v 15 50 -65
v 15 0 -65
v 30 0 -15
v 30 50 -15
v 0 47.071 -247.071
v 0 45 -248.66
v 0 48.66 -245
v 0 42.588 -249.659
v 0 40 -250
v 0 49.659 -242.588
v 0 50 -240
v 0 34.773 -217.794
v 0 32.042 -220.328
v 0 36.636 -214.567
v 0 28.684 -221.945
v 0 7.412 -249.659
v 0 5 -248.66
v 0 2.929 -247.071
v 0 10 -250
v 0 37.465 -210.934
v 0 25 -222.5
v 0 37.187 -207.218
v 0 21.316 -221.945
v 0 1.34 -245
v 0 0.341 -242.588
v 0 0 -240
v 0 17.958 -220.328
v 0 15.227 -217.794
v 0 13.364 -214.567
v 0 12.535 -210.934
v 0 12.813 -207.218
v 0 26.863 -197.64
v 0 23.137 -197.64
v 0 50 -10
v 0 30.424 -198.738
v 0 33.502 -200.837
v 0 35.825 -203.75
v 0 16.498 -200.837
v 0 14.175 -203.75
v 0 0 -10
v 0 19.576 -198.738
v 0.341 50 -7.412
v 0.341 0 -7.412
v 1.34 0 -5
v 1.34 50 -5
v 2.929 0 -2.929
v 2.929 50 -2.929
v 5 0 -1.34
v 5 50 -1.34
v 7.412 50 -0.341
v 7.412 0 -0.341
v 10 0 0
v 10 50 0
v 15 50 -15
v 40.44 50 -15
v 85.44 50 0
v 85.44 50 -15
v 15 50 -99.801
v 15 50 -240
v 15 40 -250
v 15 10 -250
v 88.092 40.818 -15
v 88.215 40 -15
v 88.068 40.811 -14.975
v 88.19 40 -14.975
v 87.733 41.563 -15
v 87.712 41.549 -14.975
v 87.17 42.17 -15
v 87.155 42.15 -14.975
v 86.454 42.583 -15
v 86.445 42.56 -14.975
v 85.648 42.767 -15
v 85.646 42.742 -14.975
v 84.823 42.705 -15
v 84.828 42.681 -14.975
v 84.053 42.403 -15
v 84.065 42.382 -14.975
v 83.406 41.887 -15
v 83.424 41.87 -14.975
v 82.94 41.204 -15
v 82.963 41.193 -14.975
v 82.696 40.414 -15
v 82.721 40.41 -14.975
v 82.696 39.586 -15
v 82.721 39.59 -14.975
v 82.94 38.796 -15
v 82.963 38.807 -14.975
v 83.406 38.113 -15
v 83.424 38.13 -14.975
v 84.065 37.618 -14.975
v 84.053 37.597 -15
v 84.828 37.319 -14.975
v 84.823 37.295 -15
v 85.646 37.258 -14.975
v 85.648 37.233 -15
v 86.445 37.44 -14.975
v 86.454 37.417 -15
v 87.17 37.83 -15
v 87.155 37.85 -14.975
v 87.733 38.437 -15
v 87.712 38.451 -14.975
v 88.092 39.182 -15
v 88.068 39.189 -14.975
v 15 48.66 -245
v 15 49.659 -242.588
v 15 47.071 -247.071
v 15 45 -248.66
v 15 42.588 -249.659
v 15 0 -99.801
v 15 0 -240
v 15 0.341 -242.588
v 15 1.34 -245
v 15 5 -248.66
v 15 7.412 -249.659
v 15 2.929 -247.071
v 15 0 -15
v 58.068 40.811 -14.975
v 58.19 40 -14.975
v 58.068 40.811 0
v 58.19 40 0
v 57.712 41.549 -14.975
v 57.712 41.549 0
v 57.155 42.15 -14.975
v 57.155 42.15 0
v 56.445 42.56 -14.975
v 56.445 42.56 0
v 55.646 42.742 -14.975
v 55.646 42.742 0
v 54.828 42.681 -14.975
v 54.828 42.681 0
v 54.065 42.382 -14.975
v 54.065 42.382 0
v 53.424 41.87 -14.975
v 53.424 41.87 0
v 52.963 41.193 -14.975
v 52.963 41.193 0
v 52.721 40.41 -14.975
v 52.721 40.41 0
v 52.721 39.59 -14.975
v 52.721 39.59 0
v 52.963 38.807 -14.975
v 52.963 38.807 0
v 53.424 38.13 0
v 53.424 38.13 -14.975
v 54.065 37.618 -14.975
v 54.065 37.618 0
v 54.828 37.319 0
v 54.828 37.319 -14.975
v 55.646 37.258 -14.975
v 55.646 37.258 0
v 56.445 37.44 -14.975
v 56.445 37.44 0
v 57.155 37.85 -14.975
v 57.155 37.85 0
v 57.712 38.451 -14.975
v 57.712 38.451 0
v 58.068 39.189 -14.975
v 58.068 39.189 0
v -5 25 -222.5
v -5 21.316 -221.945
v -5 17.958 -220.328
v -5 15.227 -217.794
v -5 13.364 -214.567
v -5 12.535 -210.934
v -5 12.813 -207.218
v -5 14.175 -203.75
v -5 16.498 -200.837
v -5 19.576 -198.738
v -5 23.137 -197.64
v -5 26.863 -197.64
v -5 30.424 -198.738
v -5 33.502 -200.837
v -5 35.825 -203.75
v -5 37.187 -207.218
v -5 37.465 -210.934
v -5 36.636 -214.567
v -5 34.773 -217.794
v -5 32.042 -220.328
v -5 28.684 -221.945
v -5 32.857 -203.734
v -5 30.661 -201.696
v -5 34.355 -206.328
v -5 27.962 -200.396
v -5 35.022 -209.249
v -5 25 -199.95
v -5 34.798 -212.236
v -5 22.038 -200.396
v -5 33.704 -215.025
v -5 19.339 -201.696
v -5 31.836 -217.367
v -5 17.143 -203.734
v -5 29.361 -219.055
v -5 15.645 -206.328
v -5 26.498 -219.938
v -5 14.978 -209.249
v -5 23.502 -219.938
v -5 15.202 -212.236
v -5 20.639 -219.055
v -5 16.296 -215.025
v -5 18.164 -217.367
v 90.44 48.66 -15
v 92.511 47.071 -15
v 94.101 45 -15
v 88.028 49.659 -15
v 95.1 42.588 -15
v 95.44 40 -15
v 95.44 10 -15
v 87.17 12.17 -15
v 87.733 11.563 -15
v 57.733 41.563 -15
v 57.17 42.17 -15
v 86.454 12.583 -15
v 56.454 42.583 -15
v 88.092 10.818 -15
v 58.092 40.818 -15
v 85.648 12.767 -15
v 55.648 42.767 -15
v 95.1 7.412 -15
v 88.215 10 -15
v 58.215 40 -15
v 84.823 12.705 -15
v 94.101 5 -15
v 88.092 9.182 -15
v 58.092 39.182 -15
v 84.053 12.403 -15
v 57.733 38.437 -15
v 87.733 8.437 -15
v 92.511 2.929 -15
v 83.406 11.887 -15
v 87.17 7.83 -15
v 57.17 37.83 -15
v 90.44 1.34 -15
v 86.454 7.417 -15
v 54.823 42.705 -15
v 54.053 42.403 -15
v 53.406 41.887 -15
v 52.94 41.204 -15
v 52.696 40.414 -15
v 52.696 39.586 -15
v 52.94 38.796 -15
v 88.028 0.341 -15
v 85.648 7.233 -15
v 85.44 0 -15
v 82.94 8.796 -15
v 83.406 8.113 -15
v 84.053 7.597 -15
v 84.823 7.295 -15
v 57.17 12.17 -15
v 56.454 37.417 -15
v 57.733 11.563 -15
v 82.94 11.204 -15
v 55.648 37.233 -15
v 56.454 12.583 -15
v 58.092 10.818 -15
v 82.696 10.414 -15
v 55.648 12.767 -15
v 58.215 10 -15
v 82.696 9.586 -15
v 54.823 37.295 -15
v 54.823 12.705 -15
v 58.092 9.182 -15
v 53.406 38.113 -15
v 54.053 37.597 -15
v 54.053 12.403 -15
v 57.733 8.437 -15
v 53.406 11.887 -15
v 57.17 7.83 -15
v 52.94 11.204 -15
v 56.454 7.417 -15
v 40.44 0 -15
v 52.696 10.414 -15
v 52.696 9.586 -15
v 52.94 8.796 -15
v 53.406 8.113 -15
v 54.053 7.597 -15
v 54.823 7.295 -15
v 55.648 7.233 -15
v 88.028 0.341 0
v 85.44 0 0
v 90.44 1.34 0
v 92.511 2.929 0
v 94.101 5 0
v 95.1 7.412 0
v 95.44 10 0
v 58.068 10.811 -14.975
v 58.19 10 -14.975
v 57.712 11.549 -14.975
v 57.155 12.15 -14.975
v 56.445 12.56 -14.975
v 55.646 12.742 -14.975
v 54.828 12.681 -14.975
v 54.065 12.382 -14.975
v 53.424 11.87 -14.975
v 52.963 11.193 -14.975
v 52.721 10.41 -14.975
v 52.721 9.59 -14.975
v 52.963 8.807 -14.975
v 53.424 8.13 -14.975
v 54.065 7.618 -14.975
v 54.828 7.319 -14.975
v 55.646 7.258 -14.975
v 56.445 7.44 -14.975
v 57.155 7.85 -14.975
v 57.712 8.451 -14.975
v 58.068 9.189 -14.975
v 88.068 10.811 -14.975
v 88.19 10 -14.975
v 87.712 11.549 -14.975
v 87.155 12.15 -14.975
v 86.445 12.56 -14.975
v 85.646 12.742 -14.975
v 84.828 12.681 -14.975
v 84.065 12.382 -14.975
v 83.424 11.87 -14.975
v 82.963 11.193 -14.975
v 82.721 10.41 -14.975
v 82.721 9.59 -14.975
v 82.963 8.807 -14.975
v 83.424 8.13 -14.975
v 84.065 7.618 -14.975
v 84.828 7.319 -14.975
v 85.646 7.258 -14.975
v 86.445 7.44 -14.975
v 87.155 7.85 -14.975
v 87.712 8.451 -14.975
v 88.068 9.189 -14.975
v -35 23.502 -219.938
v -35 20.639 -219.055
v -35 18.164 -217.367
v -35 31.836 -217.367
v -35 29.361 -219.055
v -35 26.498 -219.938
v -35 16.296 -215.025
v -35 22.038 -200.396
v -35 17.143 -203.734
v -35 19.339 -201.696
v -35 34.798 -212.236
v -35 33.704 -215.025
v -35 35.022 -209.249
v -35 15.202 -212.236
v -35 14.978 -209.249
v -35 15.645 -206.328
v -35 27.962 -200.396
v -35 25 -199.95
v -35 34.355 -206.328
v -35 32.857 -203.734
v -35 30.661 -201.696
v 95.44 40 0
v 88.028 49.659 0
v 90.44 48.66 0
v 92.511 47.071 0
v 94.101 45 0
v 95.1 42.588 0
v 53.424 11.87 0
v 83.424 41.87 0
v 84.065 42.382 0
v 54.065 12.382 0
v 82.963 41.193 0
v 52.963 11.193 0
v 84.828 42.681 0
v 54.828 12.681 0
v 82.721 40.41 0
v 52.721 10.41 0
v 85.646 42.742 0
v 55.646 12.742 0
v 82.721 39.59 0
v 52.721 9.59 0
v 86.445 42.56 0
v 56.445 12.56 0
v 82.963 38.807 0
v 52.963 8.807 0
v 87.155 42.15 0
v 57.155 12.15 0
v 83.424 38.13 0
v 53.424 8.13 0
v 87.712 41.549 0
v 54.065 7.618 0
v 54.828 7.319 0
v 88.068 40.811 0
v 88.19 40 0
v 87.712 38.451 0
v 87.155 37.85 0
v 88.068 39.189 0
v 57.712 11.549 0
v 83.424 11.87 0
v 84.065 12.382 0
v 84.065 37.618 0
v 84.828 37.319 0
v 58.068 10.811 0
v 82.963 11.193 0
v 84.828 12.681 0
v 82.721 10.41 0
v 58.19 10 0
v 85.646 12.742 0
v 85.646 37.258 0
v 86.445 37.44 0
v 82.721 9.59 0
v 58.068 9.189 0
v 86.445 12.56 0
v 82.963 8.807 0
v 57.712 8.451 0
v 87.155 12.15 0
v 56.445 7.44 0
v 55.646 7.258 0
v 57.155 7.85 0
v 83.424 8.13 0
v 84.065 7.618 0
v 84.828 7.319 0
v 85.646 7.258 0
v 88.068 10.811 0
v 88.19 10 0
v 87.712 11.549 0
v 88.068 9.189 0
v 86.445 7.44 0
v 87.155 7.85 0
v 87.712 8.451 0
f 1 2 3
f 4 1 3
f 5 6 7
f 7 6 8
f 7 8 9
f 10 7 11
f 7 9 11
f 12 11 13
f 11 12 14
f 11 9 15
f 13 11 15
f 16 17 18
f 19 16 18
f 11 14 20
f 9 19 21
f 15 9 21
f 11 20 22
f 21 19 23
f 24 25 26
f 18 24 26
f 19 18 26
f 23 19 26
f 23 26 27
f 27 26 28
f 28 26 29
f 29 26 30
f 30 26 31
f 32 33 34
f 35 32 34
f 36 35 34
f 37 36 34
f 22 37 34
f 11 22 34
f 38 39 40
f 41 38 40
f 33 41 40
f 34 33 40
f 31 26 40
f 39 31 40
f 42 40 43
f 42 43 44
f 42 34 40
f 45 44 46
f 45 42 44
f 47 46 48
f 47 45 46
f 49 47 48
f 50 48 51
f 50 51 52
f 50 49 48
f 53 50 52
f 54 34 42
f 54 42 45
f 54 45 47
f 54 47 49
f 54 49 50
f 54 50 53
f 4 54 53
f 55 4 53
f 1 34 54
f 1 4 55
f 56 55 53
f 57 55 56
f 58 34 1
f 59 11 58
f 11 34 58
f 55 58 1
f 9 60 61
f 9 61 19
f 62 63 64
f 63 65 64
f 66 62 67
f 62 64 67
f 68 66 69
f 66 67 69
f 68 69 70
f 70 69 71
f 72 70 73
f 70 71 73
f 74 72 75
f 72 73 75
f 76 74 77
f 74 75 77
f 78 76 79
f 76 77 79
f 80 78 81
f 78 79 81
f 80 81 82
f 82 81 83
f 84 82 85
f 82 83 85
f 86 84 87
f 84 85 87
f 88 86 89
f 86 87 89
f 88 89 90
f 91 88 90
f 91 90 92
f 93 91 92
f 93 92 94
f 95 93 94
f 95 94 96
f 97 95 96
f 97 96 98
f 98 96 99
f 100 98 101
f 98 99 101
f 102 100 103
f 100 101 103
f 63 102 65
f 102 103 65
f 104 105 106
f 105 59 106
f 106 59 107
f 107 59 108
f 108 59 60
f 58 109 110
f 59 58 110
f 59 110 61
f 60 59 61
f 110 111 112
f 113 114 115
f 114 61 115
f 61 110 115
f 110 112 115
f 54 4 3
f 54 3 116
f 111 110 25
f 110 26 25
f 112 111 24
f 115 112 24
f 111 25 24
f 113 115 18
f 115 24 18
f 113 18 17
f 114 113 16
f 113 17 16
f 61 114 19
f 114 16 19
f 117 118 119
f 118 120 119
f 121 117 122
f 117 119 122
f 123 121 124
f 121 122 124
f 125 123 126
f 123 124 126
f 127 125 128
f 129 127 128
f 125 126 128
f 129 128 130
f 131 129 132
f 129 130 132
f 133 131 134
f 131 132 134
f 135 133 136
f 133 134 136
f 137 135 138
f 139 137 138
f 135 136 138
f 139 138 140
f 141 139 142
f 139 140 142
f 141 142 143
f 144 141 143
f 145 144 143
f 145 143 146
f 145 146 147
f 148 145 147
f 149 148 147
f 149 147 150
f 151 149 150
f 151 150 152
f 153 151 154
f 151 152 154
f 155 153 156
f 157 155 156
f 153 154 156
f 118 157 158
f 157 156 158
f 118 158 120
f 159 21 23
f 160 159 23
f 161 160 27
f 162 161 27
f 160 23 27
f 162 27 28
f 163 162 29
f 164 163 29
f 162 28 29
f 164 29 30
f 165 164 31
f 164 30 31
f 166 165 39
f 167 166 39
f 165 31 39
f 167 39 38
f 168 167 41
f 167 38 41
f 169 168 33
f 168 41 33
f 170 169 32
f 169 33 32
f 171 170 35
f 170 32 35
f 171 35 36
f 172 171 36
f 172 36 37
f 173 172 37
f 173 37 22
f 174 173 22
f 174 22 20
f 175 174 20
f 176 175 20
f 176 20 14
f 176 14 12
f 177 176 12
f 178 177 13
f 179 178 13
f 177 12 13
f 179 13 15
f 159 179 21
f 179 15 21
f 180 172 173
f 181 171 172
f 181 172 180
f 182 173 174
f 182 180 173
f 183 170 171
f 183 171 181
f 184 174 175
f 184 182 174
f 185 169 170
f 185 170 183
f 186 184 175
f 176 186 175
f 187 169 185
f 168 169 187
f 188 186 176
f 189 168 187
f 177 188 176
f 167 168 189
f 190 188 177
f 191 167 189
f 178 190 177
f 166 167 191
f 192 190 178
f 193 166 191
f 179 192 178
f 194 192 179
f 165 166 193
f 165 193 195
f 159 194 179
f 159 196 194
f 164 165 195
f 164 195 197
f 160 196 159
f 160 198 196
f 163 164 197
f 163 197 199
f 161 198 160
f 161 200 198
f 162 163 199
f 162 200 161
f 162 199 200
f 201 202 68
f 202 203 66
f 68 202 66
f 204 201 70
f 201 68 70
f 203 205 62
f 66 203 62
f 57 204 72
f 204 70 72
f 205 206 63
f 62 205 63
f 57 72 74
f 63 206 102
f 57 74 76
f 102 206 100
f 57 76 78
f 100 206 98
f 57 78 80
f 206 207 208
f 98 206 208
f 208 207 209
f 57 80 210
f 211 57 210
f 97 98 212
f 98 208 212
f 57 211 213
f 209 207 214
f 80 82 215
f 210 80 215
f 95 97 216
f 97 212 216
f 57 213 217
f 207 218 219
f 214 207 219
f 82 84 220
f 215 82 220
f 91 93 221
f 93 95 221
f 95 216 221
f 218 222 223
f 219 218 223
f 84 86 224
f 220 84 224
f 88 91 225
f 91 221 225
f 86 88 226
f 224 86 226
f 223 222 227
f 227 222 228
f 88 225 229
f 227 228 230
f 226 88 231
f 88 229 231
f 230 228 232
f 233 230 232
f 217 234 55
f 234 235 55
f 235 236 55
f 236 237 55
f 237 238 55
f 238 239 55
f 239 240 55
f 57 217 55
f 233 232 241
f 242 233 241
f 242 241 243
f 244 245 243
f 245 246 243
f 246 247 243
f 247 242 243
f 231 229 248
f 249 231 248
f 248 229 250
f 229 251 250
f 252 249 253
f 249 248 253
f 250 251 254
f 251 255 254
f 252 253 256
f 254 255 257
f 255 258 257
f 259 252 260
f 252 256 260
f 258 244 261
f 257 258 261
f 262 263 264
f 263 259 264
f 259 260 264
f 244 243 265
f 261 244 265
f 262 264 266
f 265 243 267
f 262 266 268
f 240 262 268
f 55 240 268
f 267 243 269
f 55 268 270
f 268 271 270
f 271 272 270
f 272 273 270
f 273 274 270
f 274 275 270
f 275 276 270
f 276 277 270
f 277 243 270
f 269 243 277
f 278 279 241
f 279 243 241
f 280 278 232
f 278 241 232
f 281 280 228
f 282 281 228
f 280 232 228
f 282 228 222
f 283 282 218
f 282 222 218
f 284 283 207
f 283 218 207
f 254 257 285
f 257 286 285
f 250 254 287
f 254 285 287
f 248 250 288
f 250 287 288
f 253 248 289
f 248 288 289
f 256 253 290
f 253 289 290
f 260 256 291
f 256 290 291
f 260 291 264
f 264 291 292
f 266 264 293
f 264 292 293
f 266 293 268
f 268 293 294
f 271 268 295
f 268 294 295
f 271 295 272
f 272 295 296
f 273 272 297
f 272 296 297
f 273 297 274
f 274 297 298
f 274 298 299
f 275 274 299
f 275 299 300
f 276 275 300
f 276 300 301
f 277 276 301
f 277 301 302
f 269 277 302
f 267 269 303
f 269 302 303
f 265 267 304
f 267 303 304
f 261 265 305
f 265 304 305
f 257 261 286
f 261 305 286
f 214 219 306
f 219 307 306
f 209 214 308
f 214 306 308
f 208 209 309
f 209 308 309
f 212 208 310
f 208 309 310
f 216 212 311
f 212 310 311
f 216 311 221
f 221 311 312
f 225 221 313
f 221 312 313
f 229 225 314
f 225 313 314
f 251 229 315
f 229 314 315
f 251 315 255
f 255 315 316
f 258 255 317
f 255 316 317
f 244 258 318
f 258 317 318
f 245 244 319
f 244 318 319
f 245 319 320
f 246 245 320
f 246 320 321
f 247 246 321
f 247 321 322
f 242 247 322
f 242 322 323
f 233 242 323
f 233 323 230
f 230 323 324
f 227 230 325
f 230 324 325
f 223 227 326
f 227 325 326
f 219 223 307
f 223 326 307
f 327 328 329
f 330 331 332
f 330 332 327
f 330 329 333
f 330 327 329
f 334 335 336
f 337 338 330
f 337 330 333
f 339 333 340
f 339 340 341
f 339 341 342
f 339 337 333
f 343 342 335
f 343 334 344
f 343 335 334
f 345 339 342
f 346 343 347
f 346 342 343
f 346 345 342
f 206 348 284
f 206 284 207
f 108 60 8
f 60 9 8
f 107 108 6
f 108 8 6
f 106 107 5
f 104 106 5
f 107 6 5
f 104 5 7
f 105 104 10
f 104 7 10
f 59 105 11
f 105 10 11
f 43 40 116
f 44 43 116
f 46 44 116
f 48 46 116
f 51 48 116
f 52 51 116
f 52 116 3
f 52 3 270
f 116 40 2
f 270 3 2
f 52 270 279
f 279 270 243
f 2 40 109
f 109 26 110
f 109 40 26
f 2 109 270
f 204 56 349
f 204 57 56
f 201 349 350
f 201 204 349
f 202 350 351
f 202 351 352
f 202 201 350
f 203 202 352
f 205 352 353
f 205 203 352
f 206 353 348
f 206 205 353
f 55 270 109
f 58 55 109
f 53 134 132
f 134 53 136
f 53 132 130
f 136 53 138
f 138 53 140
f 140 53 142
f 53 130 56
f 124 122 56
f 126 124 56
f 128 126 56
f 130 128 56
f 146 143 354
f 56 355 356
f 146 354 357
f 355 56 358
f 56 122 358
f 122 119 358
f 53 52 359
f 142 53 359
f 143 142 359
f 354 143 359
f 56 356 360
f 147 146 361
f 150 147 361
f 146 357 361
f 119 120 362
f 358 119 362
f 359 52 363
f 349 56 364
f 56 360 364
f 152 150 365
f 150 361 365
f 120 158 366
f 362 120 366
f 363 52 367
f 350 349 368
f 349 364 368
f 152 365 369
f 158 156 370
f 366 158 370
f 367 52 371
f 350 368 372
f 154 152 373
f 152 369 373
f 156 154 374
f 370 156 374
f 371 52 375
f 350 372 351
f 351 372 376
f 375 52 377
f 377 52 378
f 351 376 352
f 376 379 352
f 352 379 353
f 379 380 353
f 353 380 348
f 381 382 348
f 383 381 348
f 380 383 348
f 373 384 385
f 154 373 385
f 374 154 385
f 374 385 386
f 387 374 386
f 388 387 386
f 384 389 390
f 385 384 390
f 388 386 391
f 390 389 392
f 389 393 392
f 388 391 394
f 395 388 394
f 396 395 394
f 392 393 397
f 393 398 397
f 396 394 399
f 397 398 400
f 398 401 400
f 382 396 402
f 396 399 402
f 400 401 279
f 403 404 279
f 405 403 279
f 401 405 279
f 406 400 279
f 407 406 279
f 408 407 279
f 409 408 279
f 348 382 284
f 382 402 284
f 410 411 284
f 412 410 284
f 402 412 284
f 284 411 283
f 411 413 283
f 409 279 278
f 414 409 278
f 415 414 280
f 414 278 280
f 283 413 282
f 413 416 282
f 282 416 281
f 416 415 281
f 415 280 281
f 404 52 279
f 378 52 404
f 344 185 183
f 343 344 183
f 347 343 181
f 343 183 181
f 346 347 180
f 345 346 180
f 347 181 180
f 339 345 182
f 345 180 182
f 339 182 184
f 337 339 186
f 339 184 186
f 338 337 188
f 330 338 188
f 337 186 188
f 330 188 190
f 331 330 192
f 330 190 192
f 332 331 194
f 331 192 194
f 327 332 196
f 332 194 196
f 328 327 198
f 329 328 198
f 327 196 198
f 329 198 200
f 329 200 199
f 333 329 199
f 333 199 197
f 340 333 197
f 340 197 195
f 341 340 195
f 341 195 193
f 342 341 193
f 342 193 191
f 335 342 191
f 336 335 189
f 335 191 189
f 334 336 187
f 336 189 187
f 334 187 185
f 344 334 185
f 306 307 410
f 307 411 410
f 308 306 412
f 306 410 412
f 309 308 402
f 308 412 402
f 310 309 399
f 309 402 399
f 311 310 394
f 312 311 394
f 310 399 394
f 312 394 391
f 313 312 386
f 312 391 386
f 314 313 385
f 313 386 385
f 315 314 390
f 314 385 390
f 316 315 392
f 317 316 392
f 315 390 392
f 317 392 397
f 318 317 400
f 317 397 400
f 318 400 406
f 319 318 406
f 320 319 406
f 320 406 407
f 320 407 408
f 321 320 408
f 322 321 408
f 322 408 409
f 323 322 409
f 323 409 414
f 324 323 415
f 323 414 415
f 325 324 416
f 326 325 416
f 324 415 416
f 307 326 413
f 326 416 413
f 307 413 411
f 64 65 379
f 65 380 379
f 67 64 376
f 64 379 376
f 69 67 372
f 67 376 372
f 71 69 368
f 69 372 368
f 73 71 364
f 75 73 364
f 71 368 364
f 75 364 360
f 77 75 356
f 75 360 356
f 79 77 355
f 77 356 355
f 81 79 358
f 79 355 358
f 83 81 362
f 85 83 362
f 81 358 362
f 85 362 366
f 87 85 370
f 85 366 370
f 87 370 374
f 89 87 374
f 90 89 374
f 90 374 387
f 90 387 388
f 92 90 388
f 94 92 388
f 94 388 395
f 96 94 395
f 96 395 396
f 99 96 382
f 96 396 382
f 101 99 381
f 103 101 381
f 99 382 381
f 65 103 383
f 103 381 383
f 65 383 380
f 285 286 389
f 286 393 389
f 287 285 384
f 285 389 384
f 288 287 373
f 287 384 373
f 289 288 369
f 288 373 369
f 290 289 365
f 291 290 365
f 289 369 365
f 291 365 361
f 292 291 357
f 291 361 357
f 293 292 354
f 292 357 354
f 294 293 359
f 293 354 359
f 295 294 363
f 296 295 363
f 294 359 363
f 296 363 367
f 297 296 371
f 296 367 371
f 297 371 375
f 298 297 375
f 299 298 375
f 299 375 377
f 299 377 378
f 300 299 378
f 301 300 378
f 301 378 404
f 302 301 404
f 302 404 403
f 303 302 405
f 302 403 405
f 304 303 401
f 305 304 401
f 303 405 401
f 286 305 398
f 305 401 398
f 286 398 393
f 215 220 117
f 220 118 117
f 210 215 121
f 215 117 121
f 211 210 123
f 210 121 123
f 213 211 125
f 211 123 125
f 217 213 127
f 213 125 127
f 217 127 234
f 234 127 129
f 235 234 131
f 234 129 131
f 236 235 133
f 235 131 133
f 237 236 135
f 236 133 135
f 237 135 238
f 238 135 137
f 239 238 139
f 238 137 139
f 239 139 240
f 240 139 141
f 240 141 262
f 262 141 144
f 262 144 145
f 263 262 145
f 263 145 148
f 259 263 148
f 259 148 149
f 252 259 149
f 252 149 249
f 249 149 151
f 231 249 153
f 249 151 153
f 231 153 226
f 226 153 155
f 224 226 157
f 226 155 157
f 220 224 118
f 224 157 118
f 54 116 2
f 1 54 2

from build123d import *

# Parameters (mm, degrees)
BOSS_EXTRUDE1_DEPTH = 50
FILLET2_R           = 10
SKETCH18_R          = 12.5
BOSS_EXTRUDE2_DEPTH = 5
SKETCH19_R          = 10.05
BOSS_EXTRUDE3_DEPTH = 30
FILLET1_R           = 10


# Read off the part's stored shape, not the designer's step: M5 Clearance Hole3
with BuildPart() as part:
    # Sketch1 → Boss-Extrude1 (new body)
    with BuildSketch(Plane(origin=(0, 0, 0), x_dir=(1, 0, 0), z_dir=(0, 1, 0))):
        Polygon((15, 15), (15, 250), (0, 250), (0, 0), (95.440306509, 0), (95.440306509, 15), align=None)
        Polygon((40.440306509, 15), (15, 99.801021696), (15, 65), (30, 15), align=None)
    extrude(amount=BOSS_EXTRUDE1_DEPTH)

    # Fillet2
    fillet2_edges = [part.edges().sort_by_distance(p)[0] for p in [
        (0, 25, 0),
    ]]
    fillet(fillet2_edges, radius=FILLET2_R)

    # M5 Clearance Hole3 outline → M5 Clearance Hole3 (revolve, cut)
    with BuildSketch(Plane(origin=(55.440306509, 40, 0), x_dir=(1, 0, 0), z_dir=(0, -1, 0))):
        Polygon((2.75, -14.975), (2.75, 0), (0, 0), (0, -15), (2.775, -15), align=None)
    revolve(axis=Axis((55.440306509, 40, 0), (0, 0, 1)), mode=Mode.SUBTRACT)

    # M5 Clearance Hole3 2 outline → M5 Clearance Hole3 2 (revolve, cut)
    with BuildSketch(Plane(origin=(85.440306509, 10, 0), x_dir=(1, 0, 0), z_dir=(0, -1, 0))):
        Polygon((2.75, -14.975), (2.75, 0), (0, 0), (0, -15), (2.775, -15), align=None)
    revolve(axis=Axis((85.440306509, 10, 0), (0, 0, 1)), mode=Mode.SUBTRACT)

    # M5 Clearance Hole3 3 outline → M5 Clearance Hole3 3 (revolve, cut)
    with BuildSketch(Plane(origin=(55.440306509, 10, 0), x_dir=(1, 0, 0), z_dir=(0, -1, 0))):
        Polygon((2.75, -14.975), (2.75, 0), (0, 0), (0, -15), (2.775, -15), align=None)
    revolve(axis=Axis((55.440306509, 10, 0), (0, 0, 1)), mode=Mode.SUBTRACT)

    # M5 Clearance Hole3 4 outline → M5 Clearance Hole3 4 (revolve, cut)
    with BuildSketch(Plane(origin=(85.440306509, 40, 0), x_dir=(1, 0, 0), z_dir=(0, -1, 0))):
        Polygon((2.75, -14.975), (2.75, 0), (0, 0), (0, -15), (2.775, -15), align=None)
    revolve(axis=Axis((85.440306509, 40, 0), (0, 0, 1)), mode=Mode.SUBTRACT)

    # Sketch18 → Boss-Extrude2 (add)
    with BuildSketch(Plane.ZY):
        with Locations(Location((-210, 25, 0), (0, 0, 180))):
            Circle(SKETCH18_R)
    extrude(amount=BOSS_EXTRUDE2_DEPTH)

    # Sketch19 → Boss-Extrude3 (add)
    with BuildSketch(Plane.ZY.offset(5)):
        with Locations((-210, 25)):
            Circle(SKETCH19_R)
    extrude(amount=BOSS_EXTRUDE3_DEPTH)

    # Fillet1
    fillet1_edges = [part.edges().sort_by_distance(p)[0] for p in [
        (95.440306509, 0, -7.5),
        (7.5, 0, -250),
        (7.5, 50, -250),
        (95.440306509, 50, -7.5),
    ]]
    fillet(fillet1_edges, radius=FILLET1_R)


solid = part.part
